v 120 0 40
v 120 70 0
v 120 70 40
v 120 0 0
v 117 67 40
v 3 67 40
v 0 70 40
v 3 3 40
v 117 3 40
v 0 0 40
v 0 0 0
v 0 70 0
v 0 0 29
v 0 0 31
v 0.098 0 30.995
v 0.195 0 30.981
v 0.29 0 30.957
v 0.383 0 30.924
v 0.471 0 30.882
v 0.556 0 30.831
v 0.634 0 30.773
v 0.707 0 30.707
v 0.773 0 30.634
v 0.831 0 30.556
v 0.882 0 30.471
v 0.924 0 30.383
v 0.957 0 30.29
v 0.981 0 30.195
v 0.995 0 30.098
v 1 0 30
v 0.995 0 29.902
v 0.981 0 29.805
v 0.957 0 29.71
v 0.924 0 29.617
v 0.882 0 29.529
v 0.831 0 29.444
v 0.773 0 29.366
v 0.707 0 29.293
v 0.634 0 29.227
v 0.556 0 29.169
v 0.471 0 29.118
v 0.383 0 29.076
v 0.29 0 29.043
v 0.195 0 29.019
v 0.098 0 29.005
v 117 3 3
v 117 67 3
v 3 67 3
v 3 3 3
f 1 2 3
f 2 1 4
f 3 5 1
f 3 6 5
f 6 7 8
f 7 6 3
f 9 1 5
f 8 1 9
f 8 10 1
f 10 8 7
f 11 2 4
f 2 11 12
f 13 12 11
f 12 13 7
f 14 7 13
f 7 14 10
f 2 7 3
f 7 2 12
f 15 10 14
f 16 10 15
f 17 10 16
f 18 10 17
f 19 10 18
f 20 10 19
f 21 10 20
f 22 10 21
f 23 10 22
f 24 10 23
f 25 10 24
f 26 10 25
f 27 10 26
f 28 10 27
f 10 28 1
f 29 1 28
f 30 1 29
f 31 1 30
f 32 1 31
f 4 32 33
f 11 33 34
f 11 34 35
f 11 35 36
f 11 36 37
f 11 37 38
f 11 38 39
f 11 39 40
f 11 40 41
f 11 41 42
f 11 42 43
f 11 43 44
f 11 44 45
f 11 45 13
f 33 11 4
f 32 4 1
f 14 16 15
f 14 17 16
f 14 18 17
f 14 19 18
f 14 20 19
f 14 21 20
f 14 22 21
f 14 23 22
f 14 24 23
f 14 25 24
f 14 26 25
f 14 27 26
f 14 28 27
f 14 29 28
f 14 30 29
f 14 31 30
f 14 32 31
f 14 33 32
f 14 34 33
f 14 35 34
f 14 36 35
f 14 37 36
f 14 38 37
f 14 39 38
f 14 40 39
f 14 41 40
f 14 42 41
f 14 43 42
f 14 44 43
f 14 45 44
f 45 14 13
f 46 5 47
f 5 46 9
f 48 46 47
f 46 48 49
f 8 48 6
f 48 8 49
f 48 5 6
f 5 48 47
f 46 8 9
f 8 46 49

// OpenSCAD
// Buffer tank for mini horizontal gel-electrophoresis box
outer_X = 120;          // Outer length (X)
outer_Y = 70;           // Outer width (Y)
outer_Z = 40;           // Outer height (Z)
wall_thick = 3;         // Wall thickness
floor_thick = 3;        // Floor thickness
platform_X = 60;        // Platform length in X
platform_top_z = 13;    // Platform top Z position
platform_thick = 2;     // Platform thickness
hole_dia = 2;           // Electrode wire hole diameter
hole_z = 30;            // Electrode wire hole Z position

inner_X = outer_X - 2 * wall_thick;
inner_Y = outer_Y - 2 * wall_thick;
inner_Z = outer_Z - floor_thick;
platform_Y = inner_Y;

// Platform position (centered in X, spans full inner width in Y)
platform_start_x = (outer_X - platform_X) / 2;  // Centered in the tank
platform_start_y = wall_thick;
platform_start_z = platform_top_z - platform_thick;

difference() {
    // Outer shape (bottom at z = 0)
    cube([outer_X, outer_Y, outer_Z], [0, 0, 0]);
    
    // Inner cavity (bottom at z = floor_thick)
    translate([wall_thick, wall_thick, floor_thick]) {
        cube([inner_X, inner_Y, inner_Z]);
    }
    
    // Platform
    translate([platform_start_x, platform_start_y, platform_start_z]) {
        cube([platform_X, platform_Y, platform_thick]);
    }
    
    // Electrode wire holes (along X-axis, through end walls)
    translate([0, 0, hole_z]) {
        rotate([90, 0, 0]) {
            cylinder(d = hole_dia, h = outer_X + 1, $fn = 64);
        }
    }
}
